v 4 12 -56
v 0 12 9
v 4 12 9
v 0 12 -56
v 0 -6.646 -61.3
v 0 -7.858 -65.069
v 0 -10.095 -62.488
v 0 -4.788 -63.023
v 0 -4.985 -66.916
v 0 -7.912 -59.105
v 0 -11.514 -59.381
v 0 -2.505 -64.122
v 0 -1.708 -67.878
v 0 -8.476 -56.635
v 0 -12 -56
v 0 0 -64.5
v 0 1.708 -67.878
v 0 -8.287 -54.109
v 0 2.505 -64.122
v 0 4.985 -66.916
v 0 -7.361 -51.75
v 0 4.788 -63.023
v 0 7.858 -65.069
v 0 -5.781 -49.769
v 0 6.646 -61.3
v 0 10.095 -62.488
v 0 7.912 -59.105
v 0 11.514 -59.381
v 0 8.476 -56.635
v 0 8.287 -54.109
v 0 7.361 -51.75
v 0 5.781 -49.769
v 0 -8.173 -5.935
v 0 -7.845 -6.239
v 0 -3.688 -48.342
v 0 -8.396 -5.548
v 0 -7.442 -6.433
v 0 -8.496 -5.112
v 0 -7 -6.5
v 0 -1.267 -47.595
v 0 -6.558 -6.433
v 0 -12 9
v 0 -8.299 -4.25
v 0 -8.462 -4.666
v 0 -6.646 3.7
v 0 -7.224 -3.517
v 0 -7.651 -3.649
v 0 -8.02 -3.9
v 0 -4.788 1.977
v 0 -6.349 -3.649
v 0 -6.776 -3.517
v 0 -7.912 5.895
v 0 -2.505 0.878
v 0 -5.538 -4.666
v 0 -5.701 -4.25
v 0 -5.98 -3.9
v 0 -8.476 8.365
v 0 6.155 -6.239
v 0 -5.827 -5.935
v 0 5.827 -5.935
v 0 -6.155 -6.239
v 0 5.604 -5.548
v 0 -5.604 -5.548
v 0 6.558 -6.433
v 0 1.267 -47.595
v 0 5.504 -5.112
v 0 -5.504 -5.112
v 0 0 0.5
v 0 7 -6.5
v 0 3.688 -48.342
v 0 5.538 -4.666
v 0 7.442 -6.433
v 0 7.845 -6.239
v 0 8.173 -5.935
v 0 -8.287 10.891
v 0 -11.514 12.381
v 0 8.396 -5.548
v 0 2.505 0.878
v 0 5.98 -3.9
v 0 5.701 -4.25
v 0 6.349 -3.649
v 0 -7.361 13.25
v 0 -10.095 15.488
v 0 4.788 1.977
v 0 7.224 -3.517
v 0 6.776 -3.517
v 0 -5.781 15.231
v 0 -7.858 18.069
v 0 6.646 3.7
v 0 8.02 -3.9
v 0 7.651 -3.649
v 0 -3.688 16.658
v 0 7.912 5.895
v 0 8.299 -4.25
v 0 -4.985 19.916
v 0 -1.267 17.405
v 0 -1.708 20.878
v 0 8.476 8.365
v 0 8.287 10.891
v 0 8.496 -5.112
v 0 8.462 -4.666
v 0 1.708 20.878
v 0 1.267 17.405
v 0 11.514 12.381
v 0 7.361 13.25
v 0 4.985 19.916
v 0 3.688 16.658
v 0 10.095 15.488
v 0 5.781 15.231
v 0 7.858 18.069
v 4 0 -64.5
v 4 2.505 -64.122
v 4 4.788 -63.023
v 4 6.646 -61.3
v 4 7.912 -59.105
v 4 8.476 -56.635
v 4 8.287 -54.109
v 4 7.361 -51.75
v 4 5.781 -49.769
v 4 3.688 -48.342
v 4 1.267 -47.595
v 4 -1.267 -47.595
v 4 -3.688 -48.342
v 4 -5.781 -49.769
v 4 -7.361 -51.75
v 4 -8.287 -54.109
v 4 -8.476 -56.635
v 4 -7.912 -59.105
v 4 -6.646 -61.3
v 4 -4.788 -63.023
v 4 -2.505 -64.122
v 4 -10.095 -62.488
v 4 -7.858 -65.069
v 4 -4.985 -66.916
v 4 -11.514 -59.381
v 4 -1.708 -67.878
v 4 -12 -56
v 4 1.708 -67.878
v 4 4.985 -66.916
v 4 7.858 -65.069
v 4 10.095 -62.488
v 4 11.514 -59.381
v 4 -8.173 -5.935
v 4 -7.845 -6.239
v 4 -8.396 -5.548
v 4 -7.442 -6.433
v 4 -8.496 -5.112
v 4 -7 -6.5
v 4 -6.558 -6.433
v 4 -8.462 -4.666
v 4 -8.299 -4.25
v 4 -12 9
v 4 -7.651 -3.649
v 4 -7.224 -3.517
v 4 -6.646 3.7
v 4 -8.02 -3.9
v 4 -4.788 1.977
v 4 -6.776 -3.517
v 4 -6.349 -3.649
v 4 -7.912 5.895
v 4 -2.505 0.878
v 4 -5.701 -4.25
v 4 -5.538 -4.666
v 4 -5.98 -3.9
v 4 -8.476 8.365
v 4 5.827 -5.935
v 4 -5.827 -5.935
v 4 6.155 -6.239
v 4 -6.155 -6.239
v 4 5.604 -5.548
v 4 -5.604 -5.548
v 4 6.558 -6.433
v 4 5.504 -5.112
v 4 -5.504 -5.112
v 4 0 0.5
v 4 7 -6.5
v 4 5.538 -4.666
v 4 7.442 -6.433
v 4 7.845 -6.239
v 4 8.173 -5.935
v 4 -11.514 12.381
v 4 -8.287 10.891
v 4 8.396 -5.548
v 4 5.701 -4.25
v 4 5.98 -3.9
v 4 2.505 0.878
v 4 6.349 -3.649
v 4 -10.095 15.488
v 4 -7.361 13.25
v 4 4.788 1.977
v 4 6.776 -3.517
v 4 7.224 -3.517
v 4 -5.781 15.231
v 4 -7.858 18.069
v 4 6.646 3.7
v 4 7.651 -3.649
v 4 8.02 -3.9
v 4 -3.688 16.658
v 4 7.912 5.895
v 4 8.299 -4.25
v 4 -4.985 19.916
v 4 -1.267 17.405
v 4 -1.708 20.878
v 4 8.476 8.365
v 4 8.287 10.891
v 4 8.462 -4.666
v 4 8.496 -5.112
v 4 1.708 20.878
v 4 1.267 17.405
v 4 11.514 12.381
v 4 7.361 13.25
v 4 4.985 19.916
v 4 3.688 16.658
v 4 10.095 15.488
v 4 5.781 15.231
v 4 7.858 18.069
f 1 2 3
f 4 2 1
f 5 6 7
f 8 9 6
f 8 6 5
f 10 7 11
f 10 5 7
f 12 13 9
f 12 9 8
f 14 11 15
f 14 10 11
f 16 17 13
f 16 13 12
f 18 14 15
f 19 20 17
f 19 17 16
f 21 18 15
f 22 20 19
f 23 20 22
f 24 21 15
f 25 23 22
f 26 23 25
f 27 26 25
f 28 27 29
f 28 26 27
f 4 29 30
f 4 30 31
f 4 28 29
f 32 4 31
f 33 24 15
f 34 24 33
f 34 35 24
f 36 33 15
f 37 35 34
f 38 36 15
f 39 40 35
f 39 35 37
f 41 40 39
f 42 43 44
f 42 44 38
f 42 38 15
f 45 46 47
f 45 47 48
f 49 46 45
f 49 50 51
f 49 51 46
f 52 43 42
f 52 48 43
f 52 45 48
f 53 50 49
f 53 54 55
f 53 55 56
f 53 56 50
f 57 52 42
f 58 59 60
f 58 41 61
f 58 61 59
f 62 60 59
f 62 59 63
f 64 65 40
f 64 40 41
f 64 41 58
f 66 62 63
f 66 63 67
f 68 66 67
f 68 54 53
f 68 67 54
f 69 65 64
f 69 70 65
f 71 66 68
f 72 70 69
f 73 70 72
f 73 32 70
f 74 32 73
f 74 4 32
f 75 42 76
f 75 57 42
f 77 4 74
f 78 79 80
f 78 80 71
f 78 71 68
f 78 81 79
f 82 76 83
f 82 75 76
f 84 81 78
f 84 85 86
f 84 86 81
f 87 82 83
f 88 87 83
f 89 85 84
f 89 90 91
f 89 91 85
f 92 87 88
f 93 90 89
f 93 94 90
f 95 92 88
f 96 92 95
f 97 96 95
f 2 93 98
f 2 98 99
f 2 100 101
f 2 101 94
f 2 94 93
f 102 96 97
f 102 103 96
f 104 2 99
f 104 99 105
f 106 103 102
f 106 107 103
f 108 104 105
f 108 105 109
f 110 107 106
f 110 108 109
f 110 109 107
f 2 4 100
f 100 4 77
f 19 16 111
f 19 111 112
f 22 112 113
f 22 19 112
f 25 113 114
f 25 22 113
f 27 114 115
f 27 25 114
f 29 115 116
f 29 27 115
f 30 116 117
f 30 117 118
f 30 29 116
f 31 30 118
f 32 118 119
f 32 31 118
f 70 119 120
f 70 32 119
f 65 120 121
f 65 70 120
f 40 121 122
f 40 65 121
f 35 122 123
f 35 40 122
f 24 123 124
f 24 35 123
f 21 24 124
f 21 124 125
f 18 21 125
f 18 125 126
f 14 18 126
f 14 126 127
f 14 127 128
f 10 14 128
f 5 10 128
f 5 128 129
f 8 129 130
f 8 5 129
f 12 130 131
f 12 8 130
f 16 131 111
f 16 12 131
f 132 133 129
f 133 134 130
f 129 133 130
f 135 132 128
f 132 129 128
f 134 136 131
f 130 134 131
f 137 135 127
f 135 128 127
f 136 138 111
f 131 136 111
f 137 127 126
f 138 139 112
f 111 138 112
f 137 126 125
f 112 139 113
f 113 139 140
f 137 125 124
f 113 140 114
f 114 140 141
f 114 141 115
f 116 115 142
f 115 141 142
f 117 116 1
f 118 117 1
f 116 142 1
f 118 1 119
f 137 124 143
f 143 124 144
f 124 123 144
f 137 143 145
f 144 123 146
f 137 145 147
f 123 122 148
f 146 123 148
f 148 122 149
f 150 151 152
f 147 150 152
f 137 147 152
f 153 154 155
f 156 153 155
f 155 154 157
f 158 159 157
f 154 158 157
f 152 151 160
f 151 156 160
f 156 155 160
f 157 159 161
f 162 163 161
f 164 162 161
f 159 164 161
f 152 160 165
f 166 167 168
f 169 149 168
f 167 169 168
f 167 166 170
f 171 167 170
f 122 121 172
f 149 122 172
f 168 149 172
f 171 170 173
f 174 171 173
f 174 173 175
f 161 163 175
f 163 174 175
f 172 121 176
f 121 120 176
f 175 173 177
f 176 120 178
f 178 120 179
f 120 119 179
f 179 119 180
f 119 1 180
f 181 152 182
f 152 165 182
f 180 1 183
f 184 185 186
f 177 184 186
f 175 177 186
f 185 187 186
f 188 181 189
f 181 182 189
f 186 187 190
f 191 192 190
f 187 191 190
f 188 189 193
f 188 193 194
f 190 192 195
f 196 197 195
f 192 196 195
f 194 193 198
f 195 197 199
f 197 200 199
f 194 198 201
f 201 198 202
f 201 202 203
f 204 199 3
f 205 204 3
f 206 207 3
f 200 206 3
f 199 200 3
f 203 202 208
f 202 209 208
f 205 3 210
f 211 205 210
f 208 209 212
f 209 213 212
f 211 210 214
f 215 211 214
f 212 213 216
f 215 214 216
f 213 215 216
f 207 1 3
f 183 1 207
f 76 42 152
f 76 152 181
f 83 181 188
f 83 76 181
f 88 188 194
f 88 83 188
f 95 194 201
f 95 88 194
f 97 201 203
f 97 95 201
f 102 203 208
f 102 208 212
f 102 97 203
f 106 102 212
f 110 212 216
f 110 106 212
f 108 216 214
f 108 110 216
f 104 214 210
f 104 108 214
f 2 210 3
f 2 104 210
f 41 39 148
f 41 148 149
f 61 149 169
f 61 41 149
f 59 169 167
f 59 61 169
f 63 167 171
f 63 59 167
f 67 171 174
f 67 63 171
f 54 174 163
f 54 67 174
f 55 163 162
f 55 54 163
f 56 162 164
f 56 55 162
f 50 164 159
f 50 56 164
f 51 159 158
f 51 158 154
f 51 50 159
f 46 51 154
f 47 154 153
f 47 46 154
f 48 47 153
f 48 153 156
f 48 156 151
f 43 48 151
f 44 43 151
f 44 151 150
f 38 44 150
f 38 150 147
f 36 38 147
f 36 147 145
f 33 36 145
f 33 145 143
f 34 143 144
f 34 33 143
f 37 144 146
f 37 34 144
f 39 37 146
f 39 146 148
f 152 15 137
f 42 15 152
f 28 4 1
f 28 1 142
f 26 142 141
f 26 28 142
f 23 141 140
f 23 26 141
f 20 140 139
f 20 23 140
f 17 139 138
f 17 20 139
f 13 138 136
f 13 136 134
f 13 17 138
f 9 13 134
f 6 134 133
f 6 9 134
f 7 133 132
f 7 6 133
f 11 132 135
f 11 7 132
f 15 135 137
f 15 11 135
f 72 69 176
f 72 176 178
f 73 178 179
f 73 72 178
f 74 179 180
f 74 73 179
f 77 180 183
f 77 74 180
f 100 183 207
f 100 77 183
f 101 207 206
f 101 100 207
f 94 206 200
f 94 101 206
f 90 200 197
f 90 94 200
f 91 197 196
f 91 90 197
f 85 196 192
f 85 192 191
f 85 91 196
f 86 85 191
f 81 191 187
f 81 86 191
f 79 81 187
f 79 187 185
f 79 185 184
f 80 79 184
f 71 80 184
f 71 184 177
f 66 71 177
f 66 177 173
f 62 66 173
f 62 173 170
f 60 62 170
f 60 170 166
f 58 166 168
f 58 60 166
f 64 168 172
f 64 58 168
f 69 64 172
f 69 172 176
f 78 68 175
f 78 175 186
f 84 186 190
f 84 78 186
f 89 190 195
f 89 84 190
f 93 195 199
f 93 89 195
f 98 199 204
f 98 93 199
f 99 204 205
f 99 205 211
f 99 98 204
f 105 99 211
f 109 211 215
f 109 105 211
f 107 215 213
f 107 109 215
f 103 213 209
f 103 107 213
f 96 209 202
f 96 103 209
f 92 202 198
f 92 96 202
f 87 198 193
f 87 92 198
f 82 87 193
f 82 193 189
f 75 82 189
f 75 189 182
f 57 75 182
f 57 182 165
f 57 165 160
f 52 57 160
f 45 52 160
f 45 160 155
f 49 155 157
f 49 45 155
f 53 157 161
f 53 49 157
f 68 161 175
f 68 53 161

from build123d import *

# Parameters (mm, degrees)
SKETCH_1_R      = 8.5
SKETCH_1_R_2    = 1.5
EXTRUDE_1_DEPTH = 4


with BuildPart() as part:
    # 草图1 → 凸台-拉伸1 (new body)
    with BuildSketch(Plane(origin=(0, 0, 0), x_dir=(0, 0, -1), z_dir=(1, 0, 0))):
        with BuildLine():
            Line((-9, 12), (0, 12))
            Line((0, 12), (56, 12))
            ThreePointArc((56, 12), (68, 0), (56, -12))
            Line((56, -12), (0, -12))
            Line((0, -12), (-9, -12))
            ThreePointArc((-9, -12), (-21, 0), (-9, 12))
        make_face()
        with Locations((56, 0)):
            Circle(SKETCH_1_R, mode=Mode.SUBTRACT)
        with Locations((5, 7)):
            Circle(SKETCH_1_R_2, mode=Mode.SUBTRACT)
        with Locations((5, -7)):
            Circle(SKETCH_1_R_2, mode=Mode.SUBTRACT)
        with Locations((-9, 0)):
            Circle(SKETCH_1_R, mode=Mode.SUBTRACT)
    extrude(amount=EXTRUDE_1_DEPTH)


solid = part.part
